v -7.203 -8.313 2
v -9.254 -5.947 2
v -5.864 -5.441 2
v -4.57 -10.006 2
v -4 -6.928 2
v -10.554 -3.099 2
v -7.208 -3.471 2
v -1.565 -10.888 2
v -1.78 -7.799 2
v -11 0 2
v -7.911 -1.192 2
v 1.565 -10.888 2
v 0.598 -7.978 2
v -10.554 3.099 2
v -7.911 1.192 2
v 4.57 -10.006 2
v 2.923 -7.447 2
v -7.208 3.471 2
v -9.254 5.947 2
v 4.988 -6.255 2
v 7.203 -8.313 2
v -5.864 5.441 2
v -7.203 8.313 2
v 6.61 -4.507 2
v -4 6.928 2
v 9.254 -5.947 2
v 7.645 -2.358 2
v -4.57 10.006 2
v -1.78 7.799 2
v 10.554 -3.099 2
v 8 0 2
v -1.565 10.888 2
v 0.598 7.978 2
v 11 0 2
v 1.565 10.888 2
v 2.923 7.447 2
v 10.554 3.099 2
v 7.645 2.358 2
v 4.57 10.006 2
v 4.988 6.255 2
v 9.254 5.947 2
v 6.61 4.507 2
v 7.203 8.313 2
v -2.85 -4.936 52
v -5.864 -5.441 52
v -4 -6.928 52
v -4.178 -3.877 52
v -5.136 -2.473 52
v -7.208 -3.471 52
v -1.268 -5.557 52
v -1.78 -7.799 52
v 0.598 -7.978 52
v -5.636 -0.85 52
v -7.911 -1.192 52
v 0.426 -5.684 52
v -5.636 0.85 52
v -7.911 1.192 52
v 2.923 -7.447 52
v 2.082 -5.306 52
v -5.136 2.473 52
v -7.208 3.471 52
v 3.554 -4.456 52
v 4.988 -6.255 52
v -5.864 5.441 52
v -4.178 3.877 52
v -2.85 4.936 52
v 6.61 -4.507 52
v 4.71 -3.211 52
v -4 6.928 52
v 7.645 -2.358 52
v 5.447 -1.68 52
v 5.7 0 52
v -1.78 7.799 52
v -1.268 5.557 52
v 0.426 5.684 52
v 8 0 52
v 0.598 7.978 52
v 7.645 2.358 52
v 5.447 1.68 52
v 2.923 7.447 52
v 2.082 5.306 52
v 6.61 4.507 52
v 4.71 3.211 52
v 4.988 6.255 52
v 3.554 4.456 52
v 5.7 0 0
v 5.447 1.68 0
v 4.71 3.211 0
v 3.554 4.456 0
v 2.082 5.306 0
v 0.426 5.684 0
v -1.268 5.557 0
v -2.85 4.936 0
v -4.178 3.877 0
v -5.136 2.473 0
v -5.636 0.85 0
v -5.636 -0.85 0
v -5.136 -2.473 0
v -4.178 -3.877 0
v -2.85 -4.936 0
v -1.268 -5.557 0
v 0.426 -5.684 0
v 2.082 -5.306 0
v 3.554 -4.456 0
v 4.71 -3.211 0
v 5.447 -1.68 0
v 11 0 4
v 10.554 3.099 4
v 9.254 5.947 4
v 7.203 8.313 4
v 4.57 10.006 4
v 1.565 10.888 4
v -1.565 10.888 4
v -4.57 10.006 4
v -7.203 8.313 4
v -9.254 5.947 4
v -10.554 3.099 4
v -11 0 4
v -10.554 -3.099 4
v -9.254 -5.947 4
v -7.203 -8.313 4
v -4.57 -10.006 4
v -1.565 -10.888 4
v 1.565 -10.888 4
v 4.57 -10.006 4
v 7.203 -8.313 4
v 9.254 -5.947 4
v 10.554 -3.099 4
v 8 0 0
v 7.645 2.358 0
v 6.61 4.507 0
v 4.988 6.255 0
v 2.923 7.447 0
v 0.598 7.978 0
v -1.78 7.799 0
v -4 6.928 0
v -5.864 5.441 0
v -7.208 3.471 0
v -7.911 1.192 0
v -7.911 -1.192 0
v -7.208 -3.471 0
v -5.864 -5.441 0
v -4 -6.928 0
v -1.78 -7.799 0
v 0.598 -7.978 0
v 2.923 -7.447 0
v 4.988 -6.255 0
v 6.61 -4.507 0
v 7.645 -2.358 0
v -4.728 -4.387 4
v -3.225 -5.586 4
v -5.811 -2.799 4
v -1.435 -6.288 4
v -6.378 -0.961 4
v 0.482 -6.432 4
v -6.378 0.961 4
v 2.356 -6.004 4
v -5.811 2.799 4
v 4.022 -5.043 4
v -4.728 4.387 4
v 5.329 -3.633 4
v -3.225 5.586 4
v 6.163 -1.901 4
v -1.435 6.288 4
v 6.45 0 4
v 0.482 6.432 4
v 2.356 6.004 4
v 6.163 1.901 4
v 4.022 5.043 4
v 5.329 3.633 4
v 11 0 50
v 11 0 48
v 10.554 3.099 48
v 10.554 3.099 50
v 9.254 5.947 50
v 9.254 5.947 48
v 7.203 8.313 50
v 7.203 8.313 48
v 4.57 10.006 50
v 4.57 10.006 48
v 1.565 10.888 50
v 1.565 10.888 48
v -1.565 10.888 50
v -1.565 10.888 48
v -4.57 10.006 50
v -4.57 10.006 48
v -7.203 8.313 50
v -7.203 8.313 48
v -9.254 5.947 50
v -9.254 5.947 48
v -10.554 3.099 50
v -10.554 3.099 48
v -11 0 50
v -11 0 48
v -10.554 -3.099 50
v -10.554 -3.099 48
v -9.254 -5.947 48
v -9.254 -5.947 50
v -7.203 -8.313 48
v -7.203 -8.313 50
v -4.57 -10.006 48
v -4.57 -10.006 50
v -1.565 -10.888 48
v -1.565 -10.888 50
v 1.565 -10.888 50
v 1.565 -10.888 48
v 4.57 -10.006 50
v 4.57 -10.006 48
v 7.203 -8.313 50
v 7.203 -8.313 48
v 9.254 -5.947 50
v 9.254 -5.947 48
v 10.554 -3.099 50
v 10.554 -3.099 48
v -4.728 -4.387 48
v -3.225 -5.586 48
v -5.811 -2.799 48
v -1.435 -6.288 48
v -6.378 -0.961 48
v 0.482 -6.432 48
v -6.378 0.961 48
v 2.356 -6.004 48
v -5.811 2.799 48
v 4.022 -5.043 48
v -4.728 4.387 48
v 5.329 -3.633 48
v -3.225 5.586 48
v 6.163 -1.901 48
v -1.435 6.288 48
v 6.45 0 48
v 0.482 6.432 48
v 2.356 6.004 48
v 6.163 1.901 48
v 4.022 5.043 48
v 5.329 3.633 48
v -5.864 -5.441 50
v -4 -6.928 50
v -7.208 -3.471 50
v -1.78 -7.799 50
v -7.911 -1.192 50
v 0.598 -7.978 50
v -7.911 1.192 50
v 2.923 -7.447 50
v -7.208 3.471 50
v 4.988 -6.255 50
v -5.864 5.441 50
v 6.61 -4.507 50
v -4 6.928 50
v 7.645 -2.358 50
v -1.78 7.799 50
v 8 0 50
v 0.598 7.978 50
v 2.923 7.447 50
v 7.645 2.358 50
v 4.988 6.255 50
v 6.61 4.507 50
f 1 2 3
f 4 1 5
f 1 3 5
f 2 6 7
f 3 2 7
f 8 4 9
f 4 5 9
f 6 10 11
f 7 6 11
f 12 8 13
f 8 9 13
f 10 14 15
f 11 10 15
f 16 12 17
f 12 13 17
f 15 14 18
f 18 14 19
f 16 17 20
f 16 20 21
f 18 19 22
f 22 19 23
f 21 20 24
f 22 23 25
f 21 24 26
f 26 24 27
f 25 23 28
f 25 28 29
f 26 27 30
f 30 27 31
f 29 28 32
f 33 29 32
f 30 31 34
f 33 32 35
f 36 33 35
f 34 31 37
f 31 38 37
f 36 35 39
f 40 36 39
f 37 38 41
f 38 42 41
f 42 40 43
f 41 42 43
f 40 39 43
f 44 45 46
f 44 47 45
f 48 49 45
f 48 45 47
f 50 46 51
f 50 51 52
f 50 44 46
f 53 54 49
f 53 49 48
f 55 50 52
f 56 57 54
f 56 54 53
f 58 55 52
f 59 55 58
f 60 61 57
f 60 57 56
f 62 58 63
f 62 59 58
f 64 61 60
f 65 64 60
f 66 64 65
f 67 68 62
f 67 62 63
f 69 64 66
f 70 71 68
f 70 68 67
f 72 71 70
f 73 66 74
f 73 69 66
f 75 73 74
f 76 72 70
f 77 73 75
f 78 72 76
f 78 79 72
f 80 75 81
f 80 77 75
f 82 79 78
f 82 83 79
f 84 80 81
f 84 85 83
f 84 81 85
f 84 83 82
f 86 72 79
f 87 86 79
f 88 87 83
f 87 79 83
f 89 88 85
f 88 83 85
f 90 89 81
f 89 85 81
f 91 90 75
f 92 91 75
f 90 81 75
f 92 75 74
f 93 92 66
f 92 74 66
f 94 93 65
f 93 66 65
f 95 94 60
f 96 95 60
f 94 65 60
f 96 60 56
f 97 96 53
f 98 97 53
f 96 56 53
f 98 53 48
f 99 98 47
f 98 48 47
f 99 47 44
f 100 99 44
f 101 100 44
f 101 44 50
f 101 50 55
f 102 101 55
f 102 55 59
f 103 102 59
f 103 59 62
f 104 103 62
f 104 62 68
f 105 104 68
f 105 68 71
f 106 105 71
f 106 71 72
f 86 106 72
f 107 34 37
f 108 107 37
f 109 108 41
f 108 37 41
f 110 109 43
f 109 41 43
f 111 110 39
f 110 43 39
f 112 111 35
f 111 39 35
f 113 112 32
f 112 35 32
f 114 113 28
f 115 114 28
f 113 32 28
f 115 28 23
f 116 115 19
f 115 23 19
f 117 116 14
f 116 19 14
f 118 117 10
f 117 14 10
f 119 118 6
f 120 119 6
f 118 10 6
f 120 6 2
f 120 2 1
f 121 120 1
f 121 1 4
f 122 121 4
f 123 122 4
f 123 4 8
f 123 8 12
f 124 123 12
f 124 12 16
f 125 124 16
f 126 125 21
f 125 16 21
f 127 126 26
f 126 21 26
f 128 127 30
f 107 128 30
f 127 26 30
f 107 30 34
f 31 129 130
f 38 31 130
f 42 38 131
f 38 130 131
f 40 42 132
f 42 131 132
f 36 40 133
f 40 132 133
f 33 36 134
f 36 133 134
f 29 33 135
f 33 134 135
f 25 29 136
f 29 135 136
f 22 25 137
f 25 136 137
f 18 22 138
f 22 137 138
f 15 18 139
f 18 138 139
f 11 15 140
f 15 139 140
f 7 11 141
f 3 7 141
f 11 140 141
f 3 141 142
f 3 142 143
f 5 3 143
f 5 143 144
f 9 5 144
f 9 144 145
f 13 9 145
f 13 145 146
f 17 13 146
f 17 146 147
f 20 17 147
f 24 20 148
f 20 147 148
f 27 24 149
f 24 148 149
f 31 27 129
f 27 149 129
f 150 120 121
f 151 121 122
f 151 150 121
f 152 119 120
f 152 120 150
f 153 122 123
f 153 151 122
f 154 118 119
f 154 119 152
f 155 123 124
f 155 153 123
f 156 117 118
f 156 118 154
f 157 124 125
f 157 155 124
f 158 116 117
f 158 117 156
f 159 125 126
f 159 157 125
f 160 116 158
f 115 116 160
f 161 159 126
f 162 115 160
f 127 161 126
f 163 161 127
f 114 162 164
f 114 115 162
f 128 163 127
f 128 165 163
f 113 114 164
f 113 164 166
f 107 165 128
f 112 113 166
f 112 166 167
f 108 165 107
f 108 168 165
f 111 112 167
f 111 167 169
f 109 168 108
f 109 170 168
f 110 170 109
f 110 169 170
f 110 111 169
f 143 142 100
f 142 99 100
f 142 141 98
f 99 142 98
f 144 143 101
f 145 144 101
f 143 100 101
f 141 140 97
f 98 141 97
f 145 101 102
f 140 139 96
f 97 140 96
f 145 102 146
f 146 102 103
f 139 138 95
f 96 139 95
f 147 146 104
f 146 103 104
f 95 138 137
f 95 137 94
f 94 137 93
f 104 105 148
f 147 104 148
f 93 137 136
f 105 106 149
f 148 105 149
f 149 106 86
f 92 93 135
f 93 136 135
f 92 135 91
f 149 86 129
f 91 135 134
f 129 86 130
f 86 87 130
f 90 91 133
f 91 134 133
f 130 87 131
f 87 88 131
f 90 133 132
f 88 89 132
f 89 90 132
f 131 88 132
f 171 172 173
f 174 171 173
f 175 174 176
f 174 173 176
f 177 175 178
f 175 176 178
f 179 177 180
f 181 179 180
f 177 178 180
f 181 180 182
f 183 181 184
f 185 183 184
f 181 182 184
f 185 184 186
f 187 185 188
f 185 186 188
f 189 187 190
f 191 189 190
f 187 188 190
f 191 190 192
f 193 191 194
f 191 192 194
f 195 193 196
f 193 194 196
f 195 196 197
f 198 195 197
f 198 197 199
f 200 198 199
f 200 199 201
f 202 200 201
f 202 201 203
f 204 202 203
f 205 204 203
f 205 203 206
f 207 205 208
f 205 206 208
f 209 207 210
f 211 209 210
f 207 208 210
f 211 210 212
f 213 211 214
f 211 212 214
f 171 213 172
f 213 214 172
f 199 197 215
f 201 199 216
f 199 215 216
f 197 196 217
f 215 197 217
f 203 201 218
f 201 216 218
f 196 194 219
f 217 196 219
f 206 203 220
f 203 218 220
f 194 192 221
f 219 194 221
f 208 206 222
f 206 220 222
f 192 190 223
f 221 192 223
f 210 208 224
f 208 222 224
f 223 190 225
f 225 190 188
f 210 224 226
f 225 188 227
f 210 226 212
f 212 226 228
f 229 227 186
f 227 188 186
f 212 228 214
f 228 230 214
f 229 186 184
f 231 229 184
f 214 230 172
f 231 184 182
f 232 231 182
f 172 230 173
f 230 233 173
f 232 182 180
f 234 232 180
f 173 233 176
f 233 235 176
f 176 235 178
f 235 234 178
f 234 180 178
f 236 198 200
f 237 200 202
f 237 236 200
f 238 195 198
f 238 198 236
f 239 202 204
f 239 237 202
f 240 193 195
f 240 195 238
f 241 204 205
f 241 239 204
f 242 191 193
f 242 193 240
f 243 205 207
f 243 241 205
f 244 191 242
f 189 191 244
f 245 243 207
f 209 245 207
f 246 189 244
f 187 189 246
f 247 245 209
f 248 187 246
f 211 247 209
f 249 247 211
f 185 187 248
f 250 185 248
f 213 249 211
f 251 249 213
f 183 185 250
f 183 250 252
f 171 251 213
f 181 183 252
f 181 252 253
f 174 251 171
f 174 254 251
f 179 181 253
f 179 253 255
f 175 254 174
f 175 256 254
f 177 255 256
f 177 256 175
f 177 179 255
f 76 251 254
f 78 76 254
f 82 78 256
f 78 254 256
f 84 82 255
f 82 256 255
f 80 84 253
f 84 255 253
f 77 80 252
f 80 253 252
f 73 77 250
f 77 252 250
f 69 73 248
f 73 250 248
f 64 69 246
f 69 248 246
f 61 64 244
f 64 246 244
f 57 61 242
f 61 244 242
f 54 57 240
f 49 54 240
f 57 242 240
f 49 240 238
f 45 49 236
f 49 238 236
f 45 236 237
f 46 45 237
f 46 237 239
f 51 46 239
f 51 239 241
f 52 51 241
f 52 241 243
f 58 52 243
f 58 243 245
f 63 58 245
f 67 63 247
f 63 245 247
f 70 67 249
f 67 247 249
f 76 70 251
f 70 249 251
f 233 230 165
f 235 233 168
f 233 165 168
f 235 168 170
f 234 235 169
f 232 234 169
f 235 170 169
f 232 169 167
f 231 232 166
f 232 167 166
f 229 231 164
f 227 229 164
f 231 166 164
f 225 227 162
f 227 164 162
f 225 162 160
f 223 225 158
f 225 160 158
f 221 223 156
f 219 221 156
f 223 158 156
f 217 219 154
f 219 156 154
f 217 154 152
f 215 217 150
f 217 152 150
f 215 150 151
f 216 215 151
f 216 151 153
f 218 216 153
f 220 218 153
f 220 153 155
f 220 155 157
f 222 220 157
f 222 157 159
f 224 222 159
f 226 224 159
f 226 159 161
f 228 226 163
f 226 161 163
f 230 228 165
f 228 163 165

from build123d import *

# Parameters (mm, degrees)
SKETCH1_R           = 8
BOSS_EXTRUDE1_DEPTH = 2
SKETCH2_R           = 11
BOSS_EXTRUDE2_DEPTH = 2
SKETCH3_R           = 6.45
BOSS_EXTRUDE3_DEPTH = 44
SKETCH4_R           = 11
BOSS_EXTRUDE4_DEPTH = 2
SKETCH5_R           = 8
BOSS_EXTRUDE5_DEPTH = 2
SKETCH6_R           = 5.7
CUT_EXTRUDE1_DEPTH  = 53


with BuildPart() as part:
    # Sketch1 → Boss-Extrude1 (new body)
    with BuildSketch(Plane.XY):
        Circle(SKETCH1_R)
    extrude(amount=BOSS_EXTRUDE1_DEPTH)

    # Sketch2 → Boss-Extrude2 (add)
    with BuildSketch(Plane.XY.offset(2)):
        Circle(SKETCH2_R)
    extrude(amount=BOSS_EXTRUDE2_DEPTH)

    # Sketch3 → Boss-Extrude3 (add)
    with BuildSketch(Plane.XY.offset(4)):
        Circle(SKETCH3_R)
    extrude(amount=BOSS_EXTRUDE3_DEPTH)

    # Sketch4 → Boss-Extrude4 (add)
    with BuildSketch(Plane.XY.offset(48)):
        Circle(SKETCH4_R)
    extrude(amount=BOSS_EXTRUDE4_DEPTH)

    # Sketch5 → Boss-Extrude5 (add)
    with BuildSketch(Plane.XY.offset(50)):
        Circle(SKETCH5_R)
    extrude(amount=BOSS_EXTRUDE5_DEPTH)

    # Sketch6 → Cut-Extrude1 (cut, through all)
    with BuildSketch(Plane.XY.offset(52)):
        Circle(SKETCH6_R)
    extrude(amount=-CUT_EXTRUDE1_DEPTH, mode=Mode.SUBTRACT)


solid = part.part
